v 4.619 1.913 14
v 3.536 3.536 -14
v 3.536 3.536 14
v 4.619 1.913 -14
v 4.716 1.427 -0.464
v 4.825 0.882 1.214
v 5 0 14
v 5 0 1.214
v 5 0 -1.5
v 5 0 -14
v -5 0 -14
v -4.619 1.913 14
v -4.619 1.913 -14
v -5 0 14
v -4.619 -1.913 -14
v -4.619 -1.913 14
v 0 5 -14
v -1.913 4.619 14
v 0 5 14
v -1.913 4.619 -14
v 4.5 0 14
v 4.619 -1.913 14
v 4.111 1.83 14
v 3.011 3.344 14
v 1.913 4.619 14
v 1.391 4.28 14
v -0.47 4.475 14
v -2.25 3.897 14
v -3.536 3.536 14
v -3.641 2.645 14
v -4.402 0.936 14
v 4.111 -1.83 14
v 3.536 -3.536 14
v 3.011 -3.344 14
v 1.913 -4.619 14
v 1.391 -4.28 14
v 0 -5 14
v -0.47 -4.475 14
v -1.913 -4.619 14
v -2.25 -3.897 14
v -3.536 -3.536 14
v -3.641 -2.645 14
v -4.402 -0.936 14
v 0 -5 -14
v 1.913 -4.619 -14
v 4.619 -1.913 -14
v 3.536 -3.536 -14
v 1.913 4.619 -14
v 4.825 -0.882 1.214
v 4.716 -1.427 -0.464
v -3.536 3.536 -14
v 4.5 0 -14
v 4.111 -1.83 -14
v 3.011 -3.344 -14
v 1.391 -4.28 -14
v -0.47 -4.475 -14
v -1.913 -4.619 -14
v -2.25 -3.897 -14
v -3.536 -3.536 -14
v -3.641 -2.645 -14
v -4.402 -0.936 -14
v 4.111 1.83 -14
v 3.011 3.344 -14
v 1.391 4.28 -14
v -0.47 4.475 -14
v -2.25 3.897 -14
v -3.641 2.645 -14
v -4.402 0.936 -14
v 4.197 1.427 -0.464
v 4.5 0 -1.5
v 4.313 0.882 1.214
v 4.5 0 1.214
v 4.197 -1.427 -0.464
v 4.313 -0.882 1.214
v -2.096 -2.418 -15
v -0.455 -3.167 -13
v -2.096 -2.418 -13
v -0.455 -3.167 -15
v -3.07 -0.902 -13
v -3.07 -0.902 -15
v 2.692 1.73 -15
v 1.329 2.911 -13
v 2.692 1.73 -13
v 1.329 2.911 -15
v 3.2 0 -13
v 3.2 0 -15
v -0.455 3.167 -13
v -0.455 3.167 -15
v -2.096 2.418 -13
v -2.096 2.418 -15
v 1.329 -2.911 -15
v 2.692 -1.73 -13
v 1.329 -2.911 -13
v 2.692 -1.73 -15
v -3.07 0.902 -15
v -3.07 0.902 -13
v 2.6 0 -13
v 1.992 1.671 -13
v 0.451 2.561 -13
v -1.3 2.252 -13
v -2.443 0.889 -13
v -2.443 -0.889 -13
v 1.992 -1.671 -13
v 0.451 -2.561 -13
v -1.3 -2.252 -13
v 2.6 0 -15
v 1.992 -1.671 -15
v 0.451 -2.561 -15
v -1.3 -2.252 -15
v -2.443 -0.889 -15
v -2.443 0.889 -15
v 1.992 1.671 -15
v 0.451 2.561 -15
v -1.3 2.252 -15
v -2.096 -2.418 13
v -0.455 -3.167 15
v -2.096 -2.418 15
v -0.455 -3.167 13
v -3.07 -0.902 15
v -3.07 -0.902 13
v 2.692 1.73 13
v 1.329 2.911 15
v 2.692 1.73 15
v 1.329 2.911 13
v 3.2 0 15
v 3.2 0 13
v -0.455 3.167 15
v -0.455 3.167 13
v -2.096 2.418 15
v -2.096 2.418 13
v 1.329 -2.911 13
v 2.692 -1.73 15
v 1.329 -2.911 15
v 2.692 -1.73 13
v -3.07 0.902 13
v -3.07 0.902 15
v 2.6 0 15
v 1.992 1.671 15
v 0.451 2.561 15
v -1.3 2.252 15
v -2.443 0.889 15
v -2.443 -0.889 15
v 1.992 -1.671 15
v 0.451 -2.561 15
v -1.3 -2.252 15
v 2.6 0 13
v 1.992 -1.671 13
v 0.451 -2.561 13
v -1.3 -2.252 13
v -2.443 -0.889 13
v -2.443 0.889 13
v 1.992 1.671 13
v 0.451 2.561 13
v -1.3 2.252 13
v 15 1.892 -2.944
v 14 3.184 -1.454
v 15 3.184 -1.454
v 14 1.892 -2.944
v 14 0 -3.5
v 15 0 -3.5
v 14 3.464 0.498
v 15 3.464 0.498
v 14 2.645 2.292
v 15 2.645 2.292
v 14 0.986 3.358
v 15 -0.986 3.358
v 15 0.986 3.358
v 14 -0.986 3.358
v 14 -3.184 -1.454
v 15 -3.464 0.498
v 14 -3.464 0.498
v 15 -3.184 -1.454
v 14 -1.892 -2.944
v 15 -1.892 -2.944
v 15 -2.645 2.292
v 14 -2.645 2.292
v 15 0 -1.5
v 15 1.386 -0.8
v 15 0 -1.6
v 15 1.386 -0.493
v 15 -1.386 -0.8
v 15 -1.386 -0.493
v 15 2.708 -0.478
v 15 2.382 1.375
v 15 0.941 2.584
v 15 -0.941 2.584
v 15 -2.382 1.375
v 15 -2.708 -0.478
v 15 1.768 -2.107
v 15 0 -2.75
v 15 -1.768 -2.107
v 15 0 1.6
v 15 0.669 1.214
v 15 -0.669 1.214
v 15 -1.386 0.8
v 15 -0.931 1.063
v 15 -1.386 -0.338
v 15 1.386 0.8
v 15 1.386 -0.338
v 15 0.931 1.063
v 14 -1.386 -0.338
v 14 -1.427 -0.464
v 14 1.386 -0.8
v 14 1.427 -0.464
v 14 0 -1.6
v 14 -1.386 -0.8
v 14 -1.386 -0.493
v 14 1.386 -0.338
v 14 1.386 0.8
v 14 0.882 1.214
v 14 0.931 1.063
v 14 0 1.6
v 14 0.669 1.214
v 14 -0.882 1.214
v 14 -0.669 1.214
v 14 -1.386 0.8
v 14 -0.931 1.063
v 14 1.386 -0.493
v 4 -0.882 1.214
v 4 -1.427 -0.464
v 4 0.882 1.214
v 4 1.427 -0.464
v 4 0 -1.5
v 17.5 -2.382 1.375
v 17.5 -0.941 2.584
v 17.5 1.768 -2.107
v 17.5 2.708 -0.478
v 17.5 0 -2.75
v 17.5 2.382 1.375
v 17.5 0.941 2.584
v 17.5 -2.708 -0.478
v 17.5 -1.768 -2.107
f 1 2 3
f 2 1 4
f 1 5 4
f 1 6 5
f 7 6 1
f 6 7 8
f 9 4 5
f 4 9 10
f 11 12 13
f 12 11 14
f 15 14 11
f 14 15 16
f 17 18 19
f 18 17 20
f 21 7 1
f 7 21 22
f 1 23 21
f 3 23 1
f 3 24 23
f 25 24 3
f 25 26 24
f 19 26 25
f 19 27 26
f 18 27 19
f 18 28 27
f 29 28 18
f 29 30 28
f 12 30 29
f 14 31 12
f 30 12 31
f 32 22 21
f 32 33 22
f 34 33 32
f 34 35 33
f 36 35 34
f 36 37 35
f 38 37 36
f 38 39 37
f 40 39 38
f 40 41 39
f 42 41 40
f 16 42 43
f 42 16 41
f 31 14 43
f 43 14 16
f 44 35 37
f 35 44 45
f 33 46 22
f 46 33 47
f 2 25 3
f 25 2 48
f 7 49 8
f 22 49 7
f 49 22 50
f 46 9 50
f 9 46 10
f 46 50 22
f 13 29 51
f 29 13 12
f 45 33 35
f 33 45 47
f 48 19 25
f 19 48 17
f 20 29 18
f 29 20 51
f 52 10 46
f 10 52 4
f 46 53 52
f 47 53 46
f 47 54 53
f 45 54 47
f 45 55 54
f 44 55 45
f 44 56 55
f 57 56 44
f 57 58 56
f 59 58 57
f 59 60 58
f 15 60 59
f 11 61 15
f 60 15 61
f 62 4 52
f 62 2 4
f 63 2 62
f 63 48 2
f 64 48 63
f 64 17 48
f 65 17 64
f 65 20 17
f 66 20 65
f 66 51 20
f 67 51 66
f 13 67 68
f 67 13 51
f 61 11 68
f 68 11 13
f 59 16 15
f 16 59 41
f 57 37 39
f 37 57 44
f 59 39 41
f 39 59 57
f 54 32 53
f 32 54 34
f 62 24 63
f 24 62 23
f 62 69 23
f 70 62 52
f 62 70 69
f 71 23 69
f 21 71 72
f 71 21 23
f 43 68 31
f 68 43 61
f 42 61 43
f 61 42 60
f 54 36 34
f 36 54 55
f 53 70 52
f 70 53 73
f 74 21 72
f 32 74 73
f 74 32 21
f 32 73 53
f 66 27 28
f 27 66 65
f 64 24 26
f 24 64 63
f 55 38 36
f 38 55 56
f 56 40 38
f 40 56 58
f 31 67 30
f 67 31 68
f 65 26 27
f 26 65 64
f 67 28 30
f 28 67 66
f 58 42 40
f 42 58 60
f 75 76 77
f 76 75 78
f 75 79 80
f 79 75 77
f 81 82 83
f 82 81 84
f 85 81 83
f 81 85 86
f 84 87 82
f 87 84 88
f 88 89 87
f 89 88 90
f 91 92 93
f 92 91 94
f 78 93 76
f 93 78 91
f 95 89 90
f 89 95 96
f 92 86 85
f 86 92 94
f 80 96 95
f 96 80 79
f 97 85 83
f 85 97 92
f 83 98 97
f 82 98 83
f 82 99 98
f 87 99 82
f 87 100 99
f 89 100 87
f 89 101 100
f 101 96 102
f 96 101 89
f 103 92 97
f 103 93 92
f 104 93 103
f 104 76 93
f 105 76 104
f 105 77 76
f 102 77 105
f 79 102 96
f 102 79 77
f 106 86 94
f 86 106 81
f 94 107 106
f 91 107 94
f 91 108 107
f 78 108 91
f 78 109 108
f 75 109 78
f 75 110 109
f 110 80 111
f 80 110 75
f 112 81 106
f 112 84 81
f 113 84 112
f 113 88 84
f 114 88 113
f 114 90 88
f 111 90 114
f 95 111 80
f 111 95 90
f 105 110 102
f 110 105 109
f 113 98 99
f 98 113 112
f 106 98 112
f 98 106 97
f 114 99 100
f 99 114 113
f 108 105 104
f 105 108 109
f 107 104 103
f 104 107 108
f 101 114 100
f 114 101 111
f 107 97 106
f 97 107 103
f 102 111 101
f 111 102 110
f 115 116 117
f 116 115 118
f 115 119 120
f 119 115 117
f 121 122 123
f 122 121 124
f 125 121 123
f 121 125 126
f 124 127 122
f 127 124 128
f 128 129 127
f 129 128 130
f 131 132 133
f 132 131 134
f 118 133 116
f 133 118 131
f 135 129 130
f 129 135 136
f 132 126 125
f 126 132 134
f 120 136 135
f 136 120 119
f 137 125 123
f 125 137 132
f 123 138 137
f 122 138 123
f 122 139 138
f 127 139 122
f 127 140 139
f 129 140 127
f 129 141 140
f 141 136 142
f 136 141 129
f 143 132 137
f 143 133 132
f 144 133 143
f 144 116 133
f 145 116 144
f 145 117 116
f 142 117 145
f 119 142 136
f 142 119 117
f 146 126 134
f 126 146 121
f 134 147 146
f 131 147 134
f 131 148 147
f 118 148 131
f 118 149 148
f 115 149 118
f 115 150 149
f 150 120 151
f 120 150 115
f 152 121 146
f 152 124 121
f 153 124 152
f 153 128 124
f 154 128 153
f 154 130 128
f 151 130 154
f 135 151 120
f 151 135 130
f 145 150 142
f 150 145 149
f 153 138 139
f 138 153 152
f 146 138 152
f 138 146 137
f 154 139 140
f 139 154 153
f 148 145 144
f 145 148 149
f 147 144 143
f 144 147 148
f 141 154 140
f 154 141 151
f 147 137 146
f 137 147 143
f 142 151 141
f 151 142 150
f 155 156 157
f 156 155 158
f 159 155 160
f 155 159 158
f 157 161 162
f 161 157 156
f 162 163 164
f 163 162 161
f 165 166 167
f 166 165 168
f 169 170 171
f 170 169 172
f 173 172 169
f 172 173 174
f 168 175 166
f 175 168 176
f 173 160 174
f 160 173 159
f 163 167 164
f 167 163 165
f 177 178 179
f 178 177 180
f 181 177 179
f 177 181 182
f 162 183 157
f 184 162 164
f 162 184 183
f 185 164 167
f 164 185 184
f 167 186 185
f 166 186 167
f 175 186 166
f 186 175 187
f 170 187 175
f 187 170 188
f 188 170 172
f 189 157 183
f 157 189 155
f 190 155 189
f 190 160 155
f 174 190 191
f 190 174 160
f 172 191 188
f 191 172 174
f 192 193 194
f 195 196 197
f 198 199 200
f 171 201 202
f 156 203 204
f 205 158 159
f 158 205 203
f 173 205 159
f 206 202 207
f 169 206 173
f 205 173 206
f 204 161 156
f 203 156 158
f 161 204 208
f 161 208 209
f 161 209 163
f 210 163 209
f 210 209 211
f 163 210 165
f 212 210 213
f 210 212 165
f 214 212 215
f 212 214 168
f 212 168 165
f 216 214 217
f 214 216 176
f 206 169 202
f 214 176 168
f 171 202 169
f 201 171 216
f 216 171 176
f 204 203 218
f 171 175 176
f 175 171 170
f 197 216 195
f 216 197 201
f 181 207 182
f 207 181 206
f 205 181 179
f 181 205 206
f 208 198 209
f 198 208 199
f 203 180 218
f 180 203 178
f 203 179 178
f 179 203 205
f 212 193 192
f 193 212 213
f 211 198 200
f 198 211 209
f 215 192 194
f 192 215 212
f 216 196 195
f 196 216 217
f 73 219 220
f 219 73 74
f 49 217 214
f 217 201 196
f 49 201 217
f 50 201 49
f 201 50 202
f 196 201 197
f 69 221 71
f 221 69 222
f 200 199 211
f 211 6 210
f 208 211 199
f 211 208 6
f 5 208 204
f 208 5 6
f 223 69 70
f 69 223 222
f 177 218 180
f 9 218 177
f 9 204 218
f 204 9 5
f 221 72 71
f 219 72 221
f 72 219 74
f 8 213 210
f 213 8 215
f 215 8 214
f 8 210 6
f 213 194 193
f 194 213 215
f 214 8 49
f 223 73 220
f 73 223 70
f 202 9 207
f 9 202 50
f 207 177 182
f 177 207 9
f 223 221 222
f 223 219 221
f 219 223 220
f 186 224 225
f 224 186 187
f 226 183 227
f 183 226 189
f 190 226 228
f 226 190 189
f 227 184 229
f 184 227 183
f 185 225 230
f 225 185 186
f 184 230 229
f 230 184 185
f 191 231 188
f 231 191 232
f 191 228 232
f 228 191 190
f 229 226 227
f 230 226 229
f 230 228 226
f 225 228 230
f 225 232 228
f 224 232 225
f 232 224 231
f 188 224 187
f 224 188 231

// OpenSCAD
// Parameters
bore_diameter_mm = 5; //[2.5:10:0.1]
outer_diameter_mm = 10; //[5:20:0.1]
length_mm = 28; //[14:56:0.5]
outer_radius_mm = 5; //[2.5:10:0.1]
inner_radius_mm = 2.5; //[1.25:5:0.1]
casing_wall_thickness_mm = 0.5; //[0.25:2:0.05]
seal_clearance_mm = 0.1; //[0.05:0.5:0.01]
seal_length_mm = 2; //[1:6:0.25]
seal_radial_thickness_mm = 0.6; //[0.2:2:0.05]
overlap_mm = 1; //[0.5:2:0.1]
screw_shank_diameter_mm = 3; //[2:6:0.1]
screw_length_mm = 12; //[6:30:0.5]
screw_head_diameter_mm = 5.5; //[3:10:0.1]
screw_head_height_mm = 2.5; //[1:6:0.1]
washer_outer_diameter_mm = 7; //[4:14:0.1]
washer_thickness_mm = 1; //[0.5:3:0.1]

// Linear Bearing - complete geometry
module linear_bearing() {
  color([0.85, 0.85, 0.8]) {
    // Outer casing
    difference() {
      cylinder(r=outer_radius_mm, h=length_mm, center=true);
      cylinder(r=outer_radius_mm - casing_wall_thickness_mm, h=length_mm + 2*overlap_mm, center=true);
      cylinder(r=inner_radius_mm, h=length_mm + 2*overlap_mm, center=true);
    }
    // End seals
    for (z = [-1, 1]) {
      translate([0, 0, z * (length_mm/2 - seal_length_mm/2 + overlap_mm)]) {
        difference() {
          cylinder(r=inner_radius_mm + seal_clearance_mm + seal_radial_thickness_mm, h=seal_length_mm, center=true);
          cylinder(r=inner_radius_mm + seal_clearance_mm, h=seal_length_mm + 2*overlap_mm, center=true);
        }
      }
    }
  }
}

// Screw and Washer - complete geometry
module screw_and_washer() {
  color("DimGray") {
    // Screw shank
    cylinder(r=screw_shank_diameter_mm/2, h=screw_length_mm, center=true);
    // Screw head
    translate([0, 0, screw_length_mm/2 + screw_head_height_mm/2 - overlap_mm])
      cylinder(r=screw_head_diameter_mm/2, h=screw_head_height_mm, center=true);
    // Washer
    translate([0, 0, screw_length_mm/2 - washer_thickness_mm/2 - overlap_mm]) {
      difference() {
        cylinder(r=washer_outer_diameter_mm/2, h=washer_thickness_mm, center=true);
        cylinder(r=screw_shank_diameter_mm/2 + seal_clearance_mm, h=washer_thickness_mm + 2*overlap_mm, center=true);
      }
    }
  }
}

// Assembly
module assembly() {
  linear_bearing();
  translate([outer_radius_mm + screw_length_mm/2 - overlap_mm, 0, 0])
    rotate([0, 90, 0]) screw_and_washer();
}

assembly();
